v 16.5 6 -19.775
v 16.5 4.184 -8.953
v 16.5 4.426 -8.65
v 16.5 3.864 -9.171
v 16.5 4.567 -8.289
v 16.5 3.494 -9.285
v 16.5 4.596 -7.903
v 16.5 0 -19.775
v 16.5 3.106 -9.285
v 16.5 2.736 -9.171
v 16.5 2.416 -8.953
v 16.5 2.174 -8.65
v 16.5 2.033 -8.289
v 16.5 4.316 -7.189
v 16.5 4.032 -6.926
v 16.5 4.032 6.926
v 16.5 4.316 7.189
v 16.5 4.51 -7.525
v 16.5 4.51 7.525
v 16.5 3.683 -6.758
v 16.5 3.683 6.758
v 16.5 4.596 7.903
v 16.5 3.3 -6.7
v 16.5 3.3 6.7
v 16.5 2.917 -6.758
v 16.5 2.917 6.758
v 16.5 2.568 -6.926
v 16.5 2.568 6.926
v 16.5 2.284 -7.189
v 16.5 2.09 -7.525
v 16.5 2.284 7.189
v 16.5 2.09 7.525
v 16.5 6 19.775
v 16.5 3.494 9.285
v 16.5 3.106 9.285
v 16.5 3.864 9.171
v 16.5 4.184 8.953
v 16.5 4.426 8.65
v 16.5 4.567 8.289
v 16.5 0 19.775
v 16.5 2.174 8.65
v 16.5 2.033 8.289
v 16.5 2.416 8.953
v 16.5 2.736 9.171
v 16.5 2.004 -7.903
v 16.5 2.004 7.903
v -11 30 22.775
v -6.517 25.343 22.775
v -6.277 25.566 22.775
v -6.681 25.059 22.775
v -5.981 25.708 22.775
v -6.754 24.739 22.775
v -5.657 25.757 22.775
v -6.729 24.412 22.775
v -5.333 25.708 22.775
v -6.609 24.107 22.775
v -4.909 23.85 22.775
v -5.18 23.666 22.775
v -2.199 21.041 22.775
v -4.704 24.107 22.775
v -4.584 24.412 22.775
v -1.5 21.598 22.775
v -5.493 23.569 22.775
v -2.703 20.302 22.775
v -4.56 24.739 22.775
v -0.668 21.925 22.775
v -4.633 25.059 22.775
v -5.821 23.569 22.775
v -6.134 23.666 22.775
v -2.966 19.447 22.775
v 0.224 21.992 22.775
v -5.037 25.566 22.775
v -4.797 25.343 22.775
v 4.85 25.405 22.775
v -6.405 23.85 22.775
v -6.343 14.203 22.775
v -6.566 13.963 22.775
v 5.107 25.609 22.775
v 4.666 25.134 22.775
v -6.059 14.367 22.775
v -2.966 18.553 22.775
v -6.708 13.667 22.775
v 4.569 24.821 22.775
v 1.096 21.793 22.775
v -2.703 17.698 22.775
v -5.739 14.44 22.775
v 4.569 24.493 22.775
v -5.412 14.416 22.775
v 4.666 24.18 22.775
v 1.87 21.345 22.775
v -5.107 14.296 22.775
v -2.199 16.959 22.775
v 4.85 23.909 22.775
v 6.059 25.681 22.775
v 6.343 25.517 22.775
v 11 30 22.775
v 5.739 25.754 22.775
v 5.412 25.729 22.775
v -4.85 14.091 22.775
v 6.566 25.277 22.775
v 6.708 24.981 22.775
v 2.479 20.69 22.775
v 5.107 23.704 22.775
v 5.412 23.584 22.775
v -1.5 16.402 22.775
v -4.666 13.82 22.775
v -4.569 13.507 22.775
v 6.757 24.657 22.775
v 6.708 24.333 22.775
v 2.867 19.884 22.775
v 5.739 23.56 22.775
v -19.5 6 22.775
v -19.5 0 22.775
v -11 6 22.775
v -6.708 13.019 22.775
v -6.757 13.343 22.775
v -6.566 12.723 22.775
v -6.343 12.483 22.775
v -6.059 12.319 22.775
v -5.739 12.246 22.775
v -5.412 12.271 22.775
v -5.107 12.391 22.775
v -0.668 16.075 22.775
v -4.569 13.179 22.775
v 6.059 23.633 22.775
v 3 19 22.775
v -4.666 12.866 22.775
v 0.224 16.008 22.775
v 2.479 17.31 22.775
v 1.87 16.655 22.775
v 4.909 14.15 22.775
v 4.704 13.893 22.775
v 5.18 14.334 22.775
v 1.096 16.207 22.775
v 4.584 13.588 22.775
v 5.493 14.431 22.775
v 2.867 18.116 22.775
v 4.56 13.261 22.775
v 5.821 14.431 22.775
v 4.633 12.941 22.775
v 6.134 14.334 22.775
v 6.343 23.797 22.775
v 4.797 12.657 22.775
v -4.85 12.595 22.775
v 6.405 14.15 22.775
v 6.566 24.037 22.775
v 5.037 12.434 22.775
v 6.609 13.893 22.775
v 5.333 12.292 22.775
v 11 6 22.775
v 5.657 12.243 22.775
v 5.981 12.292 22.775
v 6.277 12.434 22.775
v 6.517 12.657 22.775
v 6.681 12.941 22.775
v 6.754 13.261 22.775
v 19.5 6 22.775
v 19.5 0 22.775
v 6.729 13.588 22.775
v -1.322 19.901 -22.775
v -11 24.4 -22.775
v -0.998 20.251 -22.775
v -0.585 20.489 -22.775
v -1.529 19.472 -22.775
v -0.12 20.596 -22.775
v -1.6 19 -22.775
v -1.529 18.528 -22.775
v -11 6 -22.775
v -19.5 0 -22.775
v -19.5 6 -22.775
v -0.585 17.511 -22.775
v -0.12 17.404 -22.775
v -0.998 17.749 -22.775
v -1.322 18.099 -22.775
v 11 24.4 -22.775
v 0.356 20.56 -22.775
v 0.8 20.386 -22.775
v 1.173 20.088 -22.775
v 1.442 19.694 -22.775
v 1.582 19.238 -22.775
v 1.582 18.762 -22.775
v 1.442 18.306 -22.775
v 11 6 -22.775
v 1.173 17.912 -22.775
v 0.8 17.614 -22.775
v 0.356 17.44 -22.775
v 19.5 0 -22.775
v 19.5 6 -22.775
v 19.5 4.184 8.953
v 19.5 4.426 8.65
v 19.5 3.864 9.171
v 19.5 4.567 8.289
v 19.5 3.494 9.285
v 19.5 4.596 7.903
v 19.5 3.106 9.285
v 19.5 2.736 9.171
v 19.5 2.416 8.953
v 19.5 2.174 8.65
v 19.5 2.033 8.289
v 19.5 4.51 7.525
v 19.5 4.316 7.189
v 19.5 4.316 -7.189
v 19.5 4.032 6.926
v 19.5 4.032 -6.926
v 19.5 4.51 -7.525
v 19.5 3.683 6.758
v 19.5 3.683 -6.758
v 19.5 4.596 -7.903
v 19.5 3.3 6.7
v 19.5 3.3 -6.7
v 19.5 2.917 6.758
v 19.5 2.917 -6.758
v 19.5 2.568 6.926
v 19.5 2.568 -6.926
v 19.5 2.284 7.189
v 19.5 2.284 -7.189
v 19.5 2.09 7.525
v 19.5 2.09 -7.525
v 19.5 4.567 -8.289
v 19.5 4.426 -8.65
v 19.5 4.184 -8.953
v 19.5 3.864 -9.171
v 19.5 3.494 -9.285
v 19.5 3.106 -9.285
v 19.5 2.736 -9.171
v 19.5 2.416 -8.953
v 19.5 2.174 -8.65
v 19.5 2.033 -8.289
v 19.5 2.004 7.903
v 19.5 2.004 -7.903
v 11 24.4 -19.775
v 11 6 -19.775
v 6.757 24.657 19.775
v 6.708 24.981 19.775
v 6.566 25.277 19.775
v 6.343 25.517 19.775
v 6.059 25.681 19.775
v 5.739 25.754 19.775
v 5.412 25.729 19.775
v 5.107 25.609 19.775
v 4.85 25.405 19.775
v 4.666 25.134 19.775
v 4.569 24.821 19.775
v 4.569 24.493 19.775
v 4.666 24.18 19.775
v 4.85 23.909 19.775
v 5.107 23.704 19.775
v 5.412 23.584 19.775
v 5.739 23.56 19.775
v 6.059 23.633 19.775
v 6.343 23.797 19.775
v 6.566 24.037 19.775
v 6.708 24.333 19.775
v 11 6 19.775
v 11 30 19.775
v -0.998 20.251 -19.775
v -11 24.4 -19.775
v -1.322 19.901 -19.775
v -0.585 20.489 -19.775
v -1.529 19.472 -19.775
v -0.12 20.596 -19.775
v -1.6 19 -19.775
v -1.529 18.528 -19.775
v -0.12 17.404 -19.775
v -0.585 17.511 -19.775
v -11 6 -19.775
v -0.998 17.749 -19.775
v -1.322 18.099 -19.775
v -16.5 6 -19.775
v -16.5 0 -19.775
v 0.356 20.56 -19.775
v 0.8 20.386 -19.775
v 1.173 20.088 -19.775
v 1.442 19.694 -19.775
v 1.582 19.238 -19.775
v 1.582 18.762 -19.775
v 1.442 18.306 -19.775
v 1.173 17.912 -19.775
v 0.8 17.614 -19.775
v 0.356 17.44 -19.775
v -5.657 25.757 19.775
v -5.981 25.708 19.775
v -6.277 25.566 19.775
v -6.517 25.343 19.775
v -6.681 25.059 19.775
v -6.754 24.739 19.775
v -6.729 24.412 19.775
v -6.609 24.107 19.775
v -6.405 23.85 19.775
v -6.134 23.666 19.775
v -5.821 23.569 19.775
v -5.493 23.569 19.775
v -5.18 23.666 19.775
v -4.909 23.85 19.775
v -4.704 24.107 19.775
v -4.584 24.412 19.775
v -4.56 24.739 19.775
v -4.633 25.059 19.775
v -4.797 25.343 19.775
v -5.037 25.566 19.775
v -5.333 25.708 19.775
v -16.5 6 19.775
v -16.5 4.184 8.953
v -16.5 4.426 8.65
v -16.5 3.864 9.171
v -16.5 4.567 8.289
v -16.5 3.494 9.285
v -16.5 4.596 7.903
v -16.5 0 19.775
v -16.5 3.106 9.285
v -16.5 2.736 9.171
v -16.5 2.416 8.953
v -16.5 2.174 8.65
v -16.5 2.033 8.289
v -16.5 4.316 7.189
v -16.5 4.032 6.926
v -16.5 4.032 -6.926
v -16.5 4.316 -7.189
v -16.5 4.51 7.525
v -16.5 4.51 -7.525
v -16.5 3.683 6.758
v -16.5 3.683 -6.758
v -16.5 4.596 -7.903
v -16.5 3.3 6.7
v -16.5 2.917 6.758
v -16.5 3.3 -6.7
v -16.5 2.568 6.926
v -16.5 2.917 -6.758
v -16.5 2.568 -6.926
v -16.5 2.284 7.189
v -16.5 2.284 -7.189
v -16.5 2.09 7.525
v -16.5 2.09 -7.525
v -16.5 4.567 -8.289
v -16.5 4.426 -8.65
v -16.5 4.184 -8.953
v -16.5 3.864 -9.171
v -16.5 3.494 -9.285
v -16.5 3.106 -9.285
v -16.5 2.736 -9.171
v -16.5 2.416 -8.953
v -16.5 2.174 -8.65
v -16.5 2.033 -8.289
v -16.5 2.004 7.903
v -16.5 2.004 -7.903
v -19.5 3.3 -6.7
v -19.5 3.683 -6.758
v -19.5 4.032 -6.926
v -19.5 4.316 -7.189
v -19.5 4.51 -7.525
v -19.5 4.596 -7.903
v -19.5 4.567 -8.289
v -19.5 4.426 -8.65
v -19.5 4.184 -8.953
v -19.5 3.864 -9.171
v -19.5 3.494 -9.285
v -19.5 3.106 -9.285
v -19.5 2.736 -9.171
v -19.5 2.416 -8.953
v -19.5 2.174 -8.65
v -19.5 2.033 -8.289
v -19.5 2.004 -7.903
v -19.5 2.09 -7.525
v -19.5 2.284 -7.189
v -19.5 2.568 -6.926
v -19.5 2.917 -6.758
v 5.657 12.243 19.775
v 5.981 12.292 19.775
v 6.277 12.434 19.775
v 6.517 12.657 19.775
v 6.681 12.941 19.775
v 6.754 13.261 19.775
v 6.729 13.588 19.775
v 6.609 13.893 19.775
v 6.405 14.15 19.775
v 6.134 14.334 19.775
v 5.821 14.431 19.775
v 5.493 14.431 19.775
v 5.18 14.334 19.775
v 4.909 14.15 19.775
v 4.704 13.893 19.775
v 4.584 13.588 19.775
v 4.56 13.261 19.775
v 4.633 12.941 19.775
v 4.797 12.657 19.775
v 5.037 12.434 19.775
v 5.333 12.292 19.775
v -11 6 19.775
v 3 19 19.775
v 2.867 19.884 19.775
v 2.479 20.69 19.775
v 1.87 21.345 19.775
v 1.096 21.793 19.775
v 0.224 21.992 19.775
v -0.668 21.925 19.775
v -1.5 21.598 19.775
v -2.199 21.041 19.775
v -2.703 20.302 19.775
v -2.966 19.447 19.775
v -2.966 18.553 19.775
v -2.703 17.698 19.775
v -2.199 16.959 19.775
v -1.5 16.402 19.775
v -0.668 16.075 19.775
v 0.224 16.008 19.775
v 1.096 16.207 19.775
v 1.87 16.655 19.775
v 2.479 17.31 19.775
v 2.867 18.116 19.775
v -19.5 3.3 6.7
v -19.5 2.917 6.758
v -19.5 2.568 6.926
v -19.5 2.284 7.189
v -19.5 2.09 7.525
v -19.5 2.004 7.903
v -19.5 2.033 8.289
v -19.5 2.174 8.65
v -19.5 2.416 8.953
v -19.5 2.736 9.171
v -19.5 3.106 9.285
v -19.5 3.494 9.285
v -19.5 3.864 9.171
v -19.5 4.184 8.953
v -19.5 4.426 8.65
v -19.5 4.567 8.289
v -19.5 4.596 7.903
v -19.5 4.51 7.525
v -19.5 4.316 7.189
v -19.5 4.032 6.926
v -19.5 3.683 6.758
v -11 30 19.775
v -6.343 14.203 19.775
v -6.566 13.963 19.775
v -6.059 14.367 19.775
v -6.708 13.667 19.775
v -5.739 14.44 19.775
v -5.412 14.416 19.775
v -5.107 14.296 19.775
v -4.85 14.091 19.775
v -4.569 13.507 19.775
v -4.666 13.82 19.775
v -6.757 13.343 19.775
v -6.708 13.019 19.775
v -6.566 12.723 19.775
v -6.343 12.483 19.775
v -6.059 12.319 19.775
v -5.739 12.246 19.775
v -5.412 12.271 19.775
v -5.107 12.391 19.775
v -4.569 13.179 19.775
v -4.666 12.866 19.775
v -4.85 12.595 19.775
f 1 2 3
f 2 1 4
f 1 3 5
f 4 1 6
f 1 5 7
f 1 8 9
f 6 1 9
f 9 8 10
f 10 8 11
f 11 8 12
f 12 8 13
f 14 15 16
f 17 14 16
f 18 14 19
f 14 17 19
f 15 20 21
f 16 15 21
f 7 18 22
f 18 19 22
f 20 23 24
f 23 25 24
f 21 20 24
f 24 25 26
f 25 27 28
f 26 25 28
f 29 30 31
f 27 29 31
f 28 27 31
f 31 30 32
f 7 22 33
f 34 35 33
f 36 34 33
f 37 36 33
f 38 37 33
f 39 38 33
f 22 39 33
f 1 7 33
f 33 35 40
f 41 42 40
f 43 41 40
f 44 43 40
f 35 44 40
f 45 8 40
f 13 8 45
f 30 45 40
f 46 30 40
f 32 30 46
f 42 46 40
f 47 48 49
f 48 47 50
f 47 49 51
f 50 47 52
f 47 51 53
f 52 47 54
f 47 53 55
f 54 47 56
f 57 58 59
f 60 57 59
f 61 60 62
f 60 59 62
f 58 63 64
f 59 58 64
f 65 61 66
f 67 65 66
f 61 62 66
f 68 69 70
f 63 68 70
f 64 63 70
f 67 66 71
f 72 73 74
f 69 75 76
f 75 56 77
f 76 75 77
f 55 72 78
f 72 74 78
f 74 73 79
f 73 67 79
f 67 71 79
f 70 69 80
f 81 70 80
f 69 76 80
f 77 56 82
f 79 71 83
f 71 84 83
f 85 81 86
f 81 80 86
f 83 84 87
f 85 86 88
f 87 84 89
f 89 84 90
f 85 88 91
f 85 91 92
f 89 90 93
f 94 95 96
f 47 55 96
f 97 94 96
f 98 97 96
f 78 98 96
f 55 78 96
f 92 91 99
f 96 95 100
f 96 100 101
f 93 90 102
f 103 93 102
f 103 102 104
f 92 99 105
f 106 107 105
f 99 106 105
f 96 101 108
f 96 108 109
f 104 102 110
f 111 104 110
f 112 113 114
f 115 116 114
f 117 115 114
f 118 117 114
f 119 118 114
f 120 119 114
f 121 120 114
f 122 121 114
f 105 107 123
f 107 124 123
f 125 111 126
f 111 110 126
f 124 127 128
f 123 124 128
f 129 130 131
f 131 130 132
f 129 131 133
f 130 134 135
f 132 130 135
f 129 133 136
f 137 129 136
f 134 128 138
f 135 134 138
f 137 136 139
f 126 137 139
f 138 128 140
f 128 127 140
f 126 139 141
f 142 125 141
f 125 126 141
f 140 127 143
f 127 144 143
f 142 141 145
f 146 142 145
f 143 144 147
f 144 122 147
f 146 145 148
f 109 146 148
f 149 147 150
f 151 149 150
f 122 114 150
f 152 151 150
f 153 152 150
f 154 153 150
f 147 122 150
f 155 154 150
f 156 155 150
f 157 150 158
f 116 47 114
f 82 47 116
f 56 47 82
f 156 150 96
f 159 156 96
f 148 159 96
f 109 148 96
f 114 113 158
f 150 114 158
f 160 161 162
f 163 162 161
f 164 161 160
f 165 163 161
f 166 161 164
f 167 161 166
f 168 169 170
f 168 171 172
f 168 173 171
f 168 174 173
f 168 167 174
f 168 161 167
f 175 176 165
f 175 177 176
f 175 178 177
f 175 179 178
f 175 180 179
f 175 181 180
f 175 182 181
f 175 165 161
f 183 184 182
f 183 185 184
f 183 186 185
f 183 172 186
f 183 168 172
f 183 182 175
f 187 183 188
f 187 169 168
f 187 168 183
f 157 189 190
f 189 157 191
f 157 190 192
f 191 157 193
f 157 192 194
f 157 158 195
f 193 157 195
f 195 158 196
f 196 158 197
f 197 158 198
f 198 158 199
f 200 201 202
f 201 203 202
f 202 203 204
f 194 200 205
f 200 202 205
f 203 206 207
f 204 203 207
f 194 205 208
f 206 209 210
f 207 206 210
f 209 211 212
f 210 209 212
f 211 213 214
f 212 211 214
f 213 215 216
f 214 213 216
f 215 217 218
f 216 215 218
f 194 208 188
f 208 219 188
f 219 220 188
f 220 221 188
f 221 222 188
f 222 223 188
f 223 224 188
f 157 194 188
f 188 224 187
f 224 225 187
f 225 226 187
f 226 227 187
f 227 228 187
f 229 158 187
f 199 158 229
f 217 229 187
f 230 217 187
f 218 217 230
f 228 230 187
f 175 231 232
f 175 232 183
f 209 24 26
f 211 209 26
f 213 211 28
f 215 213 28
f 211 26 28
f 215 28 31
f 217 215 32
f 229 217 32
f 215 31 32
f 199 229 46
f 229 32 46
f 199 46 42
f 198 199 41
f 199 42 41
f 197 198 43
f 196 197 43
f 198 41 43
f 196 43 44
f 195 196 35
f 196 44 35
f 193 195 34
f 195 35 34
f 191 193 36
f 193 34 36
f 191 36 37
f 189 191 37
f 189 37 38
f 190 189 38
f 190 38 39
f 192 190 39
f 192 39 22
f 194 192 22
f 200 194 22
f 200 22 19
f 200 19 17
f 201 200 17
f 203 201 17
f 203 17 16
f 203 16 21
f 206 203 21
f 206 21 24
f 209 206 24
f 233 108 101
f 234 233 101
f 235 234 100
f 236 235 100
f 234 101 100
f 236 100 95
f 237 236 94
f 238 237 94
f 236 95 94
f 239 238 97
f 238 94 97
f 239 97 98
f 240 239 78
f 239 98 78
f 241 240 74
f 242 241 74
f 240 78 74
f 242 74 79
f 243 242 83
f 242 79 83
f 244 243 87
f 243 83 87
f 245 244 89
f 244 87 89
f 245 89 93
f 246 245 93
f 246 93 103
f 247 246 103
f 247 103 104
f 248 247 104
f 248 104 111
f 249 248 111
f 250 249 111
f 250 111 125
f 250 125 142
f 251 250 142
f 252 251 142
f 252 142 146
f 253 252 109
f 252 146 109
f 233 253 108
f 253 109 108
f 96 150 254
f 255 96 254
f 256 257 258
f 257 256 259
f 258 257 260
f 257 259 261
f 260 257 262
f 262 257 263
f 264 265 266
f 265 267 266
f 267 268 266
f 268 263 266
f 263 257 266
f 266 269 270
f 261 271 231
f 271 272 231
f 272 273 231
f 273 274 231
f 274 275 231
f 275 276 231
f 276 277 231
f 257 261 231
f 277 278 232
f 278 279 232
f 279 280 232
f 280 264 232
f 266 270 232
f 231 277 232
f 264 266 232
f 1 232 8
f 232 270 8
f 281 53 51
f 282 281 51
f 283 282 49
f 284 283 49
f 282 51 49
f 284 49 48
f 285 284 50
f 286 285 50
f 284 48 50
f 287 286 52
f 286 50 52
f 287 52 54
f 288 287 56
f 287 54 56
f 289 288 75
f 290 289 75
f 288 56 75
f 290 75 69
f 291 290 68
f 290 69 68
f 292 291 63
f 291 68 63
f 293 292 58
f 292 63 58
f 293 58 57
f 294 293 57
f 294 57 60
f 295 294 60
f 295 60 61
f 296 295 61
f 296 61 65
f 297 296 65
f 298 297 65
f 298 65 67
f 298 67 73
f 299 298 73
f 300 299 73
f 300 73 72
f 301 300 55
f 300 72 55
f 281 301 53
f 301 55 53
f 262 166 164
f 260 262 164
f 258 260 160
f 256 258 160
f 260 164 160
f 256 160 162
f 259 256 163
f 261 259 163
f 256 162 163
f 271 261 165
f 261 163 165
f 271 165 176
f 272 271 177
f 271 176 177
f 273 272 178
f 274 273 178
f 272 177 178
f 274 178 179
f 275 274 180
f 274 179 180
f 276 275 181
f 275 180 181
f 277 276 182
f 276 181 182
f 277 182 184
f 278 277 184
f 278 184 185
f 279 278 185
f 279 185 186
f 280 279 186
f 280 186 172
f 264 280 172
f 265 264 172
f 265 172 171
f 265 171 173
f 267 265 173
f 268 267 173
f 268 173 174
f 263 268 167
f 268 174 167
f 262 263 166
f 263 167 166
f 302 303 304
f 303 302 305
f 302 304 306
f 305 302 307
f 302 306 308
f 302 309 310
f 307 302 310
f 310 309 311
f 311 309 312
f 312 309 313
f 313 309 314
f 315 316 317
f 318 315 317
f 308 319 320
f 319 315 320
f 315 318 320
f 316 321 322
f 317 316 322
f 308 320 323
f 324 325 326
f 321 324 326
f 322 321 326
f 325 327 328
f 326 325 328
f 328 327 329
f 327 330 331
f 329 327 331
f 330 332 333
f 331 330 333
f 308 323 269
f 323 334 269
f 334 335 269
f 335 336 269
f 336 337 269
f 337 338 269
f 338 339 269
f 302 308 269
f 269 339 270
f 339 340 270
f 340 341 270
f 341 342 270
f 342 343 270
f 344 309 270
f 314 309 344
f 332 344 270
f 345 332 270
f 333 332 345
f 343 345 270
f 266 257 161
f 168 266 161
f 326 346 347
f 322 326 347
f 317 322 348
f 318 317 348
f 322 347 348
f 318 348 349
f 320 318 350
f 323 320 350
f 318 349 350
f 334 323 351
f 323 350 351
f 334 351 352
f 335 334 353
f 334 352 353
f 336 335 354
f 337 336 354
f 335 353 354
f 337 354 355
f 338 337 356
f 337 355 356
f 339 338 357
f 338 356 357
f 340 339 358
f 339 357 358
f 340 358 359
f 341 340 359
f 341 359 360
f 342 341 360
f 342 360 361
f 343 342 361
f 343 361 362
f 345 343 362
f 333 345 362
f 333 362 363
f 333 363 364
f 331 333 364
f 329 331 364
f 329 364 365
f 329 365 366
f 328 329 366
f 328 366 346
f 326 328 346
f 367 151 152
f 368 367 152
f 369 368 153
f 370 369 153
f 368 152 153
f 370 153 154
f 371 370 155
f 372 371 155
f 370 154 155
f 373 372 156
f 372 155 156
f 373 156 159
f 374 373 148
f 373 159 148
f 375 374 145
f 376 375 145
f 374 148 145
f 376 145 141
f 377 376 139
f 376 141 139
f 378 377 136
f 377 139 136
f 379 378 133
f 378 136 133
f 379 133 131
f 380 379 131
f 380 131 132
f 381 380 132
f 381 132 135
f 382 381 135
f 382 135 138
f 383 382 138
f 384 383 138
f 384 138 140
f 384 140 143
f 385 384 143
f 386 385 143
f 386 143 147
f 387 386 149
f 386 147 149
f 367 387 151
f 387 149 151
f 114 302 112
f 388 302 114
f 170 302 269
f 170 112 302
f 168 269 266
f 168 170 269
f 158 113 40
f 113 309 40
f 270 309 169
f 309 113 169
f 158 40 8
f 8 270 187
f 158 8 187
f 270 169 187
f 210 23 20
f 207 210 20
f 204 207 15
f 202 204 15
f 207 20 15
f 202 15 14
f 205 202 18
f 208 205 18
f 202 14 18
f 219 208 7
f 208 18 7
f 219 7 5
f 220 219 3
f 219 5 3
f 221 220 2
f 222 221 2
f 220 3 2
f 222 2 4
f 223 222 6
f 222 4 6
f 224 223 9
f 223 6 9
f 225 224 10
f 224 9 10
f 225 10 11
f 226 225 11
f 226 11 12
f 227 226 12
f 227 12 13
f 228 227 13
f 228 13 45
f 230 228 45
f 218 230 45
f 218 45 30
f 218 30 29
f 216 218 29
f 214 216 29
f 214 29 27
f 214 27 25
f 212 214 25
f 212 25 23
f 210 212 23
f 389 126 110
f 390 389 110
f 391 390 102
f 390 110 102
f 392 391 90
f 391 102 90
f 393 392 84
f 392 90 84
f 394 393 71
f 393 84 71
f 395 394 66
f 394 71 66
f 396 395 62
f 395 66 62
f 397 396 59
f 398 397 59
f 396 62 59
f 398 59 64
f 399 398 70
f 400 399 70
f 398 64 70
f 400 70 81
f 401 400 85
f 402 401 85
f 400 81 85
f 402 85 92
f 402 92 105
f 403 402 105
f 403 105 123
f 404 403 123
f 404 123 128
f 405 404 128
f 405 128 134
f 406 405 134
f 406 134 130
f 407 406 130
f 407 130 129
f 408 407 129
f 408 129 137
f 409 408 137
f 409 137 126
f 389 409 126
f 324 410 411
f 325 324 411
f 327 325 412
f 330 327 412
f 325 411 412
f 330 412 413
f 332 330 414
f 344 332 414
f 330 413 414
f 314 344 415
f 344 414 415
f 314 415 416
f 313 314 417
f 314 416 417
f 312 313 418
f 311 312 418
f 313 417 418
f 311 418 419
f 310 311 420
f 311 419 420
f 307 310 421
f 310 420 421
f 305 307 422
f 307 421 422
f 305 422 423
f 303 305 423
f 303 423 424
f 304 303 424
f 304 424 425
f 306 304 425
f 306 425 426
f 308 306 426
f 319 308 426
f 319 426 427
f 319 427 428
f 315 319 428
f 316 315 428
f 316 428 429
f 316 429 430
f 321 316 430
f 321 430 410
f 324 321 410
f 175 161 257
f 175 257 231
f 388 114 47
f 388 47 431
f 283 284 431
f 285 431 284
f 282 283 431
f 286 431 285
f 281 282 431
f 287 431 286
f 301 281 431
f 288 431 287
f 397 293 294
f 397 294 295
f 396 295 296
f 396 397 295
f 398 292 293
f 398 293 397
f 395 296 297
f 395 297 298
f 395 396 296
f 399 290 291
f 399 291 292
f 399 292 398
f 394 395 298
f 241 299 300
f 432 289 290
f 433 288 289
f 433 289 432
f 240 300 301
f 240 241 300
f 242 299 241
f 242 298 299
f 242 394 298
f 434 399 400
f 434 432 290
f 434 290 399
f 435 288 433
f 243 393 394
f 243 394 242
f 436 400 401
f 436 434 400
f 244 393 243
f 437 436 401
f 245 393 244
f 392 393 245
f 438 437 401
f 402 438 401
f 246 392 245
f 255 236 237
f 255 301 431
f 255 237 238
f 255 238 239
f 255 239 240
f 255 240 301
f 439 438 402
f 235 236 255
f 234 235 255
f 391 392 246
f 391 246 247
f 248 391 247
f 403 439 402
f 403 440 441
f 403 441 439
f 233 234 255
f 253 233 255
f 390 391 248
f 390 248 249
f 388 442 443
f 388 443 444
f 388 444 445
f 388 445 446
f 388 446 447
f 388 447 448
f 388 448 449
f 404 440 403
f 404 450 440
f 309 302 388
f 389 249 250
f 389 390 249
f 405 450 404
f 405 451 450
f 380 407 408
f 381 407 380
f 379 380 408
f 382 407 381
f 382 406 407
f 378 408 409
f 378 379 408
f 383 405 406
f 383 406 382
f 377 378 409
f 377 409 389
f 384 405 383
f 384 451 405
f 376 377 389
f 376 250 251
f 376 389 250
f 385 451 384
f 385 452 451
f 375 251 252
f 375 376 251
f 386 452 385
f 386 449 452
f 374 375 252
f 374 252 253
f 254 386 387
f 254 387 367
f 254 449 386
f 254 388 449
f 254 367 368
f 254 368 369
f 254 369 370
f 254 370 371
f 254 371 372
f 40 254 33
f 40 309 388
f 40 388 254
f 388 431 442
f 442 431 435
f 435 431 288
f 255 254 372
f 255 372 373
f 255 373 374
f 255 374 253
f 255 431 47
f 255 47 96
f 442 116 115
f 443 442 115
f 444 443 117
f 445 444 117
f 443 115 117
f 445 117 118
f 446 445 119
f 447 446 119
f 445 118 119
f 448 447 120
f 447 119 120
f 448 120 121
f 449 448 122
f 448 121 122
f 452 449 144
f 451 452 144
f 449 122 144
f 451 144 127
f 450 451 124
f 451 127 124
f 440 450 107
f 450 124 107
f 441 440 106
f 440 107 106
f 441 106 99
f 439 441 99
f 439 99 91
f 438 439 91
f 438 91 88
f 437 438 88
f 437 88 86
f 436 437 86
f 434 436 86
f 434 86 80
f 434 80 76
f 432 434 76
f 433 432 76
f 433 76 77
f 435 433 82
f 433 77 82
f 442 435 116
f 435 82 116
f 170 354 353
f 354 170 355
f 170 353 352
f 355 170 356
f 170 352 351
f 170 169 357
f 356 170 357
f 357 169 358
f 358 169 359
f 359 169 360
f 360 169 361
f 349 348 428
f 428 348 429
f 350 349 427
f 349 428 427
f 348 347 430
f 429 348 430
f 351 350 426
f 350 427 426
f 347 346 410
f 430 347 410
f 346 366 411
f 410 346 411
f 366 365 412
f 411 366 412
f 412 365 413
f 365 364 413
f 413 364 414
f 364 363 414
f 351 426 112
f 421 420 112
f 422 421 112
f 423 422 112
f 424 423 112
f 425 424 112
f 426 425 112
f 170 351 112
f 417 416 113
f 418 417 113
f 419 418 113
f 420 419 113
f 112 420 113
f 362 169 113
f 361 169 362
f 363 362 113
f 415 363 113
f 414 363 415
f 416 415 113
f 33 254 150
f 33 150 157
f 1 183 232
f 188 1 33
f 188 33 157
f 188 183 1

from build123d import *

# Parameters (mm, degrees)
BOSS_EXTRUDE1_DEPTH   = 6
BOSS_EXTRUDE1_2_DEPTH = 6
SKETCH1_3_W           = 22
SKETCH1_3_H           = 3
BOSS_EXTRUDE2_DEPTH   = 30
SKETCH1_4_W           = 22
SKETCH1_4_H           = 3
BOSS_EXTRUDE3_DEPTH   = 24.4
CUT_EXTRUDE1_REACH    = 56.219
SKETCH3_R             = 1.3
SKETCH4_R             = 1.6
CUT_EXTRUDE2_DEPTH    = 3
SKETCH5_R             = 3
SKETCH5_R_2           = 1.1
CUT_EXTRUDE3_DEPTH    = 3
CIRPATTERN1_COUNT     = 4


with BuildPart() as part:
    # Sketch1 → Boss-Extrude1 (new body)
    with BuildSketch(Plane(origin=(0, 0, 0), x_dir=(1, 0, 0), z_dir=(0, 1, 0))):
        Polygon((-11, 19.775), (-11, 22.775), (-19.5, 22.775), (-19.5, -22.775), (-11, -22.775), (-11, -19.775), (-16.5, -19.775), (-16.5, 19.775), align=None)
    extrude(amount=BOSS_EXTRUDE1_DEPTH)



with BuildPart() as body_2:
    # Sketch1 → Boss-Extrude1 2 (new body)
    with BuildSketch(Plane(origin=(0, 0, 0), x_dir=(1, 0, 0), z_dir=(0, 1, 0))):
        Polygon((19.5, -22.775), (19.5, 22.775), (11, 22.775), (11, 19.775), (16.5, 19.775), (16.5, -19.775), (11, -19.775), (11, -22.775), align=None)
    extrude(amount=BOSS_EXTRUDE1_2_DEPTH)


with BuildPart() as part_1:
    add(part.part)

    add(body_2.part)  # Boss-Extrude2 merges body 2
    # Sketch1<3> → Boss-Extrude2 (add)
    with BuildSketch(Plane(origin=(0, 0, 0), x_dir=(1, 0, 0), z_dir=(0, 1, 0))):
        with Locations((0, -21.275)):
            Rectangle(SKETCH1_3_W, SKETCH1_3_H)
    extrude(amount=BOSS_EXTRUDE2_DEPTH)

    # Sketch1<4> → Boss-Extrude3 (add)
    with BuildSketch(Plane(origin=(0, 0, 0), x_dir=(1, 0, 0), z_dir=(0, 1, 0))):
        with Locations((0, 21.275)):
            Rectangle(SKETCH1_4_W, SKETCH1_4_H)
    extrude(amount=BOSS_EXTRUDE3_DEPTH)

    # Cut-Extrude1: up to this face of the body (flat: up to its plane)
    cut_extrude1_end = Plane(part_1.part.faces().sort_by_distance((19.5, 3, 0))[0])
    # Sketch3 → Cut-Extrude1 (cut, up to the picked face)
    with BuildSketch(Plane.ZY.offset(19.5), mode=Mode.PRIVATE) as cut_extrude1_sk1:
        with Locations((-8, 3.3)):
            Circle(SKETCH3_R)
    cut_extrude1_tool1 = split(extrude(cut_extrude1_sk1.sketch, amount=-CUT_EXTRUDE1_REACH, mode=Mode.PRIVATE), bisect_by=cut_extrude1_end, keep=Keep.BOTH, mode=Mode.PRIVATE)
    # Sketch3 → Cut-Extrude1 (cut, up to the picked face)
    with BuildSketch(Plane.ZY.offset(19.5), mode=Mode.PRIVATE) as cut_extrude1_sk2:
        with Locations(Location((8, 3.3, 0), (0, 0, 180))):
            Circle(SKETCH3_R)
    cut_extrude1_tool2 = split(extrude(cut_extrude1_sk2.sketch, amount=-CUT_EXTRUDE1_REACH, mode=Mode.PRIVATE), bisect_by=cut_extrude1_end, keep=Keep.BOTH, mode=Mode.PRIVATE)
    add(cut_extrude1_tool1.solids().sort_by(Axis((-19.5, 3.3, -8), (1, 0, 0)))[0], mode=Mode.SUBTRACT)
    add(cut_extrude1_tool2.solids().sort_by(Axis((-19.5, 3.3, 8), (1, 0, 0)))[0], mode=Mode.SUBTRACT)

    # Sketch4 → Cut-Extrude2 (cut)
    with BuildSketch(Plane(origin=(0, 0, -22.775), x_dir=(-1, 0, 0), z_dir=(0, 0, -1))):
        with Locations((0, 19)):
            Circle(SKETCH4_R)
    extrude(amount=-CUT_EXTRUDE2_DEPTH, mode=Mode.SUBTRACT)

    # Sketch5 → Cut-Extrude3 (cut)
    with BuildSketch(Plane.XY.offset(22.775)):
        with Locations((0, 19)):
            Circle(SKETCH5_R)
        with Locations((5.656854249, 24.656854249)):
            Circle(SKETCH5_R_2)
    cut_extrude3 = extrude(amount=-CUT_EXTRUDE3_DEPTH, mode=Mode.SUBTRACT)

    # CirPattern1: Cut-Extrude3 ×4 about axis
    cirpattern1_axis = Axis((0, 19, 0), (0, 0, 1))
    for i in range(1, CIRPATTERN1_COUNT):
        add(cut_extrude3.rotate(cirpattern1_axis, i * 360 / CIRPATTERN1_COUNT), mode=Mode.SUBTRACT)


solid = part_1.part
